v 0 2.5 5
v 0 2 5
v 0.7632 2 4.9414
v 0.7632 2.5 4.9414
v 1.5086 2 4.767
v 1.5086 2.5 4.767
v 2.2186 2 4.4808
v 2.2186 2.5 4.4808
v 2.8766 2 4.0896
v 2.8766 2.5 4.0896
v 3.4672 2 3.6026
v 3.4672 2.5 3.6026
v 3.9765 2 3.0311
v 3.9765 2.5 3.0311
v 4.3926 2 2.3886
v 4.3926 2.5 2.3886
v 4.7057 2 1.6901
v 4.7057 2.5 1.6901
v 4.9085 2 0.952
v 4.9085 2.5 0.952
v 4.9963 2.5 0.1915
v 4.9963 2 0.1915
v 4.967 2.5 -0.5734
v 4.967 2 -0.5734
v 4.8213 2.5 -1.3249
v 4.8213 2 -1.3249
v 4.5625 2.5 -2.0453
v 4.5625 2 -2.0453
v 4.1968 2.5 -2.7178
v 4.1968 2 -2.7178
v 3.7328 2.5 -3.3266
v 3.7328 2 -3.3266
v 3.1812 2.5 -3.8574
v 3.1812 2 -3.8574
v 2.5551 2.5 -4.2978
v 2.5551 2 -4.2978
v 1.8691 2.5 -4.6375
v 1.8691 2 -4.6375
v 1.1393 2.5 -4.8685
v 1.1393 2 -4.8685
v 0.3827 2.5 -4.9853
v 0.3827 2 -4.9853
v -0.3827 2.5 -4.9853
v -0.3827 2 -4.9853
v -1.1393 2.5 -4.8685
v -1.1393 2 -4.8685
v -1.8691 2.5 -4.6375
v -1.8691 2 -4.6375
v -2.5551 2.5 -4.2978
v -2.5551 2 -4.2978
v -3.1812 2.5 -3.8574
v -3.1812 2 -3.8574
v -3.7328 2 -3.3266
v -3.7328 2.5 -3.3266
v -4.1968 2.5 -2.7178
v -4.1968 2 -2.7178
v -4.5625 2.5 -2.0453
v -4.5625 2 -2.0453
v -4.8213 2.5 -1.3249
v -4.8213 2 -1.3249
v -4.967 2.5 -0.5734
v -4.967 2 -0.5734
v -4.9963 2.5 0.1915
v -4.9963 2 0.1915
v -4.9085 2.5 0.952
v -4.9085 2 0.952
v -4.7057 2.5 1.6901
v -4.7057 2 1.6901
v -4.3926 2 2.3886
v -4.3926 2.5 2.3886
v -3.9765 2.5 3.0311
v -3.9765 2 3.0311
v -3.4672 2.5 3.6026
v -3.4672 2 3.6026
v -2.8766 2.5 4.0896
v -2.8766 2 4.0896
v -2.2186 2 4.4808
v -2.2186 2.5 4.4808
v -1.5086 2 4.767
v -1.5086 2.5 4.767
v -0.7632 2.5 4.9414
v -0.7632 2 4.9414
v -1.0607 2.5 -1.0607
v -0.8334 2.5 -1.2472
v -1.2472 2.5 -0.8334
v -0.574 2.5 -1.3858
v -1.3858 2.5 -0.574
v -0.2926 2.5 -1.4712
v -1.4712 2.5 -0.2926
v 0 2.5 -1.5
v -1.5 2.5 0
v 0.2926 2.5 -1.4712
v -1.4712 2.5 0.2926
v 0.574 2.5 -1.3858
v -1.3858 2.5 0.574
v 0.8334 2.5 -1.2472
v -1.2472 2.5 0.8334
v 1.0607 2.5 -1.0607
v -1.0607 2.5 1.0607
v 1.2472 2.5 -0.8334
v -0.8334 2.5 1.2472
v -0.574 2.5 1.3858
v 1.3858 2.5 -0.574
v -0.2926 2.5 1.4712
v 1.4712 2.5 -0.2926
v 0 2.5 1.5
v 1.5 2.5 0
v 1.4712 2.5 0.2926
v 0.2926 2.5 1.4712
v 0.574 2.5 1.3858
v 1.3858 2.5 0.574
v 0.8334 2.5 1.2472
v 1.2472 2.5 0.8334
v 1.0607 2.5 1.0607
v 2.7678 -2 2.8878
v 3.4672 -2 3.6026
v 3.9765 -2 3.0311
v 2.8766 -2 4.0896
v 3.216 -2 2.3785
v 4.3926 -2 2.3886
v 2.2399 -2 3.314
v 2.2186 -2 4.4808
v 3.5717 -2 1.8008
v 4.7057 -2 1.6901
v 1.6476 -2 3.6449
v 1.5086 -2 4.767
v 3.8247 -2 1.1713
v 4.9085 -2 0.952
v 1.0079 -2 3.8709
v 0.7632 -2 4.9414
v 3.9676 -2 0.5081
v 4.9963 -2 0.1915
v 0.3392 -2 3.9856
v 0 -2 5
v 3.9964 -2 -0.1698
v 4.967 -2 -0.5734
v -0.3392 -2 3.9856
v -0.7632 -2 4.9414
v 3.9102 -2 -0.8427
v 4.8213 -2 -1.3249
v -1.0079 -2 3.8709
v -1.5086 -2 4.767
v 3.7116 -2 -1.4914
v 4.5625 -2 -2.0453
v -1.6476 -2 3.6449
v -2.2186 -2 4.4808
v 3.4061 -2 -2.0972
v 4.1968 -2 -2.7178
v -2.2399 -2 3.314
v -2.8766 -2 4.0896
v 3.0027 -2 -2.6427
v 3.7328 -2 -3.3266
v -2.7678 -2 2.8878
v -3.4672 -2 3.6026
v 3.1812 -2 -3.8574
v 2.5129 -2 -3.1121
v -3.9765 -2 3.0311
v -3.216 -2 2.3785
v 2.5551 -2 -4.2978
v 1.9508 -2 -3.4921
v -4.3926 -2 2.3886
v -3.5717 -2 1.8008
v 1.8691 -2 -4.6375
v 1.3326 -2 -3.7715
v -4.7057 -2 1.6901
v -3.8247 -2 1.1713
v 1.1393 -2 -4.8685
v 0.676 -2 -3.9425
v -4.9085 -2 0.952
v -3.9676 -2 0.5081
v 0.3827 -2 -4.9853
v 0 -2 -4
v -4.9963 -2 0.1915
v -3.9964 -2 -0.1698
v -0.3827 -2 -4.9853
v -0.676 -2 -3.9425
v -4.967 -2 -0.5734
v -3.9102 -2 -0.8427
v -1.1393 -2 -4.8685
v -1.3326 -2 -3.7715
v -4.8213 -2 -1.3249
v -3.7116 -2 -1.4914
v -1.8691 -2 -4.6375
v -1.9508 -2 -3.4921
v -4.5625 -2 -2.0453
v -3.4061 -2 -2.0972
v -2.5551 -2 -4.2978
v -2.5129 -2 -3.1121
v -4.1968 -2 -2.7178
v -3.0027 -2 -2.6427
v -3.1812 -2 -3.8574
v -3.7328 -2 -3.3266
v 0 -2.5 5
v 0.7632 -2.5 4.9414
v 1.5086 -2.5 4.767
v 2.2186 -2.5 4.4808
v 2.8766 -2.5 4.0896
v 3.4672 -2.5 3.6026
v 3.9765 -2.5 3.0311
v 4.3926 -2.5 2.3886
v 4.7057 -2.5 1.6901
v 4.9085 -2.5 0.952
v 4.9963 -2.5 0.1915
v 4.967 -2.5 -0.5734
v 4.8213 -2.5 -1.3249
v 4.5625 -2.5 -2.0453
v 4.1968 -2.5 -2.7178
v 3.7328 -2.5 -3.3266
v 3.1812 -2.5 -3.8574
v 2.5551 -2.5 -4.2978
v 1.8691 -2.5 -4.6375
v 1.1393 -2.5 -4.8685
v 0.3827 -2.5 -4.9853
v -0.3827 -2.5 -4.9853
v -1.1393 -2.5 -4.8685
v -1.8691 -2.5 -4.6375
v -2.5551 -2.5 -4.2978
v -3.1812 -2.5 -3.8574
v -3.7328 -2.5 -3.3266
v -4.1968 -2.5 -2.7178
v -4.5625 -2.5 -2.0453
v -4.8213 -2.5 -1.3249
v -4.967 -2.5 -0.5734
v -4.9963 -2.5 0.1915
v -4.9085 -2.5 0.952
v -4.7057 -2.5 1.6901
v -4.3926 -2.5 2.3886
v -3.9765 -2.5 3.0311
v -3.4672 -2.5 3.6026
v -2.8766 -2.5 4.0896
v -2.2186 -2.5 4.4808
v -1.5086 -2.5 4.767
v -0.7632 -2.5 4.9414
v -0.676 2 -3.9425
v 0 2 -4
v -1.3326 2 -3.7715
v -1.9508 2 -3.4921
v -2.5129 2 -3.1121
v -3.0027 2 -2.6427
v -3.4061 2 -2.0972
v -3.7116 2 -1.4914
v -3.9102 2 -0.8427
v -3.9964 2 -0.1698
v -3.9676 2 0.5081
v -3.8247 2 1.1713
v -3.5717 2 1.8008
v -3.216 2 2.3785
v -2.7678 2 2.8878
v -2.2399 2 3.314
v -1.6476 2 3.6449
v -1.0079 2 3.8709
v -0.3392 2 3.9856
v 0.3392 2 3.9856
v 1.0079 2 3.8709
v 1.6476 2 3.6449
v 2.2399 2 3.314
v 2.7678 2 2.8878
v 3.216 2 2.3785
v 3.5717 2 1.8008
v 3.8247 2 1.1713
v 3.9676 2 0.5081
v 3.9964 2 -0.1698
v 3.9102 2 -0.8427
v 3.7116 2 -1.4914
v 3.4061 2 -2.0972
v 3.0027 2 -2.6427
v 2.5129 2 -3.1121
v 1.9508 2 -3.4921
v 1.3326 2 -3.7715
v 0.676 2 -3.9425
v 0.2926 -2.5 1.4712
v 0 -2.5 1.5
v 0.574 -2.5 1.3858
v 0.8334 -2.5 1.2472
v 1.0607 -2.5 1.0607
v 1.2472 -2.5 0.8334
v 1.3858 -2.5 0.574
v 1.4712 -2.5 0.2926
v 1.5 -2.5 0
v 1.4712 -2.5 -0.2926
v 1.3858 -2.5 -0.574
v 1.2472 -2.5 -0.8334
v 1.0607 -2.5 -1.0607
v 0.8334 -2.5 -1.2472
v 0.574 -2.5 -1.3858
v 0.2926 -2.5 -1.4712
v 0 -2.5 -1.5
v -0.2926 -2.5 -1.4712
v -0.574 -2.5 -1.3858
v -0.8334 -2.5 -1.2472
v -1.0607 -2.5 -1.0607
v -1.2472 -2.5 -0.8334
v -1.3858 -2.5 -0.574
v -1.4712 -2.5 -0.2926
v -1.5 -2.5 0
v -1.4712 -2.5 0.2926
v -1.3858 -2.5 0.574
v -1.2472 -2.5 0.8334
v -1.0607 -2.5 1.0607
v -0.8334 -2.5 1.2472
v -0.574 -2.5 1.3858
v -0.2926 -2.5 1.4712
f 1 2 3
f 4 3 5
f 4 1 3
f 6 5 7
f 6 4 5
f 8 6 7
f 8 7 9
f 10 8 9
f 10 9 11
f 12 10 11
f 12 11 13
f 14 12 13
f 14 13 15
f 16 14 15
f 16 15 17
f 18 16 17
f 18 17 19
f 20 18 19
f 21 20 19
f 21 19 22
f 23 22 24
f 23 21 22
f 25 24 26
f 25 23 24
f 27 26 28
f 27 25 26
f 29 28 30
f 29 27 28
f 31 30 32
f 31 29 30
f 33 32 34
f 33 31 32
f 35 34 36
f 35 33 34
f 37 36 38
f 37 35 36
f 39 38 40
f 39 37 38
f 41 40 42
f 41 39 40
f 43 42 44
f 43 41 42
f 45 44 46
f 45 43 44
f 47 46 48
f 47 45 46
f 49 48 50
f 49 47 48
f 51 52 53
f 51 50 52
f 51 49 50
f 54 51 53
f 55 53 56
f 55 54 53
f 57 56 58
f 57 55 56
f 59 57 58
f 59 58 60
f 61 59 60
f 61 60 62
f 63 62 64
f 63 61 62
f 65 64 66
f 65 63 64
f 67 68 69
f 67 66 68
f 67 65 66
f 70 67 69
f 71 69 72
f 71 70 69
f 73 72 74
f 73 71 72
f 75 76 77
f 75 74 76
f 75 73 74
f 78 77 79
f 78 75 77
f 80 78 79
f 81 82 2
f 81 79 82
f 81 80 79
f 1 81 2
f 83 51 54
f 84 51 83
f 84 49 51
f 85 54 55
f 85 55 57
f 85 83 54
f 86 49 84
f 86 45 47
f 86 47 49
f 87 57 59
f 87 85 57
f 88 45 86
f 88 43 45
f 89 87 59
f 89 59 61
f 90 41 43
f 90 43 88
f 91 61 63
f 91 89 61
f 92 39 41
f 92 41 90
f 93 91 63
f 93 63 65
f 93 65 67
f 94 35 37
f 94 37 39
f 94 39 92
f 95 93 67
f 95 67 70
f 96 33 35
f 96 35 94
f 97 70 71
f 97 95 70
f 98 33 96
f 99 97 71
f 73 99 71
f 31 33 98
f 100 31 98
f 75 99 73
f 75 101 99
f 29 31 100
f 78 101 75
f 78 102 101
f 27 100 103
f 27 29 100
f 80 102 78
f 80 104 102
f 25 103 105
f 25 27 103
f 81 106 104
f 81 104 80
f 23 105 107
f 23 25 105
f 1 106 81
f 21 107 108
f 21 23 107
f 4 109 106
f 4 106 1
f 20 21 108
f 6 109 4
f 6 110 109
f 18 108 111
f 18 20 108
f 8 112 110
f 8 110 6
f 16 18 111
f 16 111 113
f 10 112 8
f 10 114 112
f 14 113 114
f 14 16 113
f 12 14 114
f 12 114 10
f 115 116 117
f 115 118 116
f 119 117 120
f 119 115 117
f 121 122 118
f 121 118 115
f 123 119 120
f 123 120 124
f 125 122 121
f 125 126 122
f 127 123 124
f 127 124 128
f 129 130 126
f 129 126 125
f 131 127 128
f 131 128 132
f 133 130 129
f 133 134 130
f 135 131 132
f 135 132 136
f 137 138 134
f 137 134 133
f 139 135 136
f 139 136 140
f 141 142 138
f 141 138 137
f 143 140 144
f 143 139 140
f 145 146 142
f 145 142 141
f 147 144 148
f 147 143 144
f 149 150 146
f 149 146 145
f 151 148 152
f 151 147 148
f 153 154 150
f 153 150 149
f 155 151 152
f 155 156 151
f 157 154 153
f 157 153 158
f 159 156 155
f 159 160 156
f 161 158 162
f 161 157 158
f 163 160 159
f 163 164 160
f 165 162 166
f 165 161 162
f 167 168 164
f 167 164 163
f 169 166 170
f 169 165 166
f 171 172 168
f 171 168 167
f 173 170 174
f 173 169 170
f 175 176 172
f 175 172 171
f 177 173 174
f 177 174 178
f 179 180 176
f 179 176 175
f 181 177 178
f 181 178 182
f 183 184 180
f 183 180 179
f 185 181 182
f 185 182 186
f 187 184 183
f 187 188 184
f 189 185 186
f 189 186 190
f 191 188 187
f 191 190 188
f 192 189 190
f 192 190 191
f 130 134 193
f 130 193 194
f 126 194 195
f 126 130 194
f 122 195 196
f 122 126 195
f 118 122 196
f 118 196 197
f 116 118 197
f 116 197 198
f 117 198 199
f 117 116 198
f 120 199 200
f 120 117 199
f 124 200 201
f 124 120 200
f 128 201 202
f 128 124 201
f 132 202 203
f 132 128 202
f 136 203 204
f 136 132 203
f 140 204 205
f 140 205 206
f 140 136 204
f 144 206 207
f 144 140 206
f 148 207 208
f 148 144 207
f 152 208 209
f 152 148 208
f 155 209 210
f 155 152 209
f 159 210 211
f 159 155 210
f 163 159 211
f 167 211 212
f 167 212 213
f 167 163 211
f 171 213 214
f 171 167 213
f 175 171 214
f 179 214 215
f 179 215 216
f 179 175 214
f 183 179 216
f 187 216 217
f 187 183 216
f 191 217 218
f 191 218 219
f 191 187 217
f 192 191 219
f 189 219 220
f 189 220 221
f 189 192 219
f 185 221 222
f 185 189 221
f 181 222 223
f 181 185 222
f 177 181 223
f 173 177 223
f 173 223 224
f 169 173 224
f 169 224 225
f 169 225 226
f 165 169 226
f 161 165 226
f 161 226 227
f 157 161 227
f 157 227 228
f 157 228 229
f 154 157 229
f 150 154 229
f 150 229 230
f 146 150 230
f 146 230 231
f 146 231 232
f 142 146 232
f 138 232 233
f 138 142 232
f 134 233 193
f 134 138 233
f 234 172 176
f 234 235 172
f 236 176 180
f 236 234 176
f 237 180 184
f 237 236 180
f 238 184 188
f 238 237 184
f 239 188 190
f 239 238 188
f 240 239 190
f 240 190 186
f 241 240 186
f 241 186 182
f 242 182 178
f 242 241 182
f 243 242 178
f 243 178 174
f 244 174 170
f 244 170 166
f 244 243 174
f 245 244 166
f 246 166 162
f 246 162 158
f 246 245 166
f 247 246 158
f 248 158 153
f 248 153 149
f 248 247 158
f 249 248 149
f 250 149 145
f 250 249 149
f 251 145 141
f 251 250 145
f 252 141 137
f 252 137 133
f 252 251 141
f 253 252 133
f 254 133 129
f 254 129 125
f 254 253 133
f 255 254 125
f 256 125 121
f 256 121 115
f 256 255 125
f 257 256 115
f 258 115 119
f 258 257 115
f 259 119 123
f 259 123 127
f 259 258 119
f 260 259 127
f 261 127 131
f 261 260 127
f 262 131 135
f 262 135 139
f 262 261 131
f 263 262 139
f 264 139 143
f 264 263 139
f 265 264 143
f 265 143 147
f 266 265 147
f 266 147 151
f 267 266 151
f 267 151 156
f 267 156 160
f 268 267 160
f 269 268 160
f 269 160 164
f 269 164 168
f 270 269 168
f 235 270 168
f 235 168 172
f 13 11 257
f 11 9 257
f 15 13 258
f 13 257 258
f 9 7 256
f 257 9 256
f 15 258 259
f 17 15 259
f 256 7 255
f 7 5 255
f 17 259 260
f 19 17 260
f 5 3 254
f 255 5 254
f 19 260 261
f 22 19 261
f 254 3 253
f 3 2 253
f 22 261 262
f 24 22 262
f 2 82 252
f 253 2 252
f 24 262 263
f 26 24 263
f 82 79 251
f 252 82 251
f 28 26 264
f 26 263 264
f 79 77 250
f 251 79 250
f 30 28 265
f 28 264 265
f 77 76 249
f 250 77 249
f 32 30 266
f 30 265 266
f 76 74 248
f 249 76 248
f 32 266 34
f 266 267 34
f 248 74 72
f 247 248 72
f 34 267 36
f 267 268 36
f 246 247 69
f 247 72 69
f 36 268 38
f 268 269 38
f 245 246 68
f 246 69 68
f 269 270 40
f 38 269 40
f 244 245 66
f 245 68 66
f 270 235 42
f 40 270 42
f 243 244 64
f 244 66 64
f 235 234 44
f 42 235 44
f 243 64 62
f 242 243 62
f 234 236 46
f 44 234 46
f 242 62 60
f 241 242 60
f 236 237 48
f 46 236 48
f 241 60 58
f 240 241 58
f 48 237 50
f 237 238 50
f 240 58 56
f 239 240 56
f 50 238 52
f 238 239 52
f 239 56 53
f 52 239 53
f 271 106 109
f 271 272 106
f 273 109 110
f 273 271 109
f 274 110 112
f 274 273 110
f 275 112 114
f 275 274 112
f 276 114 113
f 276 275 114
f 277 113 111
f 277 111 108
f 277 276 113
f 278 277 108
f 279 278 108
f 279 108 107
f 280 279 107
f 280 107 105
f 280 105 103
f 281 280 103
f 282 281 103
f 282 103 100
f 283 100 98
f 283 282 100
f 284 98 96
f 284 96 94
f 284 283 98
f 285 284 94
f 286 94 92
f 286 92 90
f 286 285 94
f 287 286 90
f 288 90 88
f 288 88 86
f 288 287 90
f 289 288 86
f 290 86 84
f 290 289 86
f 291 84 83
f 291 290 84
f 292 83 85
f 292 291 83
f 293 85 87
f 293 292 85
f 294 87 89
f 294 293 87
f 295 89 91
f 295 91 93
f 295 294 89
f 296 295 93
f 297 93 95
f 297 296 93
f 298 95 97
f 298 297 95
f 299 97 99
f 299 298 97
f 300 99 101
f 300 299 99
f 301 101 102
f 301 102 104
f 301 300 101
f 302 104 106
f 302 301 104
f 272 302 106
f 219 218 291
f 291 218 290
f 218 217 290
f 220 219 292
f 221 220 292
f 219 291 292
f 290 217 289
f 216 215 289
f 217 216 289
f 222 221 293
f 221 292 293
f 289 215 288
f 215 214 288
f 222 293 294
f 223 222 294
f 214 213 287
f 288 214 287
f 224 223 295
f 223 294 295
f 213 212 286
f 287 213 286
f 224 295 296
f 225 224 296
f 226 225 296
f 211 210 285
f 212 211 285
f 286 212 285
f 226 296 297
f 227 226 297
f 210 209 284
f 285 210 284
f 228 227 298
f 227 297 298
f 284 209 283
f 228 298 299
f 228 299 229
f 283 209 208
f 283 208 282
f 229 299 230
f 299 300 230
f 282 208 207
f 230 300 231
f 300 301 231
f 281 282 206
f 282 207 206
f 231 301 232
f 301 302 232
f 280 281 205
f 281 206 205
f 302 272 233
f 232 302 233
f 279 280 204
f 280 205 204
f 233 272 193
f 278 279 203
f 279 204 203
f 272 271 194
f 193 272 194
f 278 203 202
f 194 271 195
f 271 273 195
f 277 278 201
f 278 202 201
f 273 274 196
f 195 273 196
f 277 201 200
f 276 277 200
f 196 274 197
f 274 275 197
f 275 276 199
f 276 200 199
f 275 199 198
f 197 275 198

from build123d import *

# Parameters (mm, degrees)
SKETCH1_R           = 5
SKETCH1_R_2         = 1.5
BOSS_EXTRUDE1_DEPTH = 2.5
SKETCH2_W           = 1
SKETCH2_H           = 4


with BuildPart() as part:
    # Sketch1 → Boss-Extrude1 (new, symmetric)
    with BuildSketch(Plane(origin=(0, 0, 0), x_dir=(1, 0, 0), z_dir=(0, 1, 0))):
        with Locations(Location((0, 0, 0), (0, 0, 270))):
            Circle(SKETCH1_R)
        with Locations(Location((0, 0, 0), (0, 0, 270))):
            Circle(SKETCH1_R_2, mode=Mode.SUBTRACT)
    extrude(amount=BOSS_EXTRUDE1_DEPTH, both=True)

    # Sketch2 → Cut-Revolve1 (revolve, cut)
    with BuildSketch(Plane(origin=(0, 0, 0), x_dir=(0, 0, -1), z_dir=(1, 0, 0)), mode=Mode.PRIVATE) as cut_revolve1_sk:
        with Locations((-4.5, 0)):
            Rectangle(SKETCH2_W, SKETCH2_H)
    revolve(cut_revolve1_sk.sketch.rotate(Axis((0, 0, 0), (0, 1, 0)), 180), axis=Axis((0, 0, 0), (0, 1, 0)), mode=Mode.SUBTRACT)


solid = part.part
